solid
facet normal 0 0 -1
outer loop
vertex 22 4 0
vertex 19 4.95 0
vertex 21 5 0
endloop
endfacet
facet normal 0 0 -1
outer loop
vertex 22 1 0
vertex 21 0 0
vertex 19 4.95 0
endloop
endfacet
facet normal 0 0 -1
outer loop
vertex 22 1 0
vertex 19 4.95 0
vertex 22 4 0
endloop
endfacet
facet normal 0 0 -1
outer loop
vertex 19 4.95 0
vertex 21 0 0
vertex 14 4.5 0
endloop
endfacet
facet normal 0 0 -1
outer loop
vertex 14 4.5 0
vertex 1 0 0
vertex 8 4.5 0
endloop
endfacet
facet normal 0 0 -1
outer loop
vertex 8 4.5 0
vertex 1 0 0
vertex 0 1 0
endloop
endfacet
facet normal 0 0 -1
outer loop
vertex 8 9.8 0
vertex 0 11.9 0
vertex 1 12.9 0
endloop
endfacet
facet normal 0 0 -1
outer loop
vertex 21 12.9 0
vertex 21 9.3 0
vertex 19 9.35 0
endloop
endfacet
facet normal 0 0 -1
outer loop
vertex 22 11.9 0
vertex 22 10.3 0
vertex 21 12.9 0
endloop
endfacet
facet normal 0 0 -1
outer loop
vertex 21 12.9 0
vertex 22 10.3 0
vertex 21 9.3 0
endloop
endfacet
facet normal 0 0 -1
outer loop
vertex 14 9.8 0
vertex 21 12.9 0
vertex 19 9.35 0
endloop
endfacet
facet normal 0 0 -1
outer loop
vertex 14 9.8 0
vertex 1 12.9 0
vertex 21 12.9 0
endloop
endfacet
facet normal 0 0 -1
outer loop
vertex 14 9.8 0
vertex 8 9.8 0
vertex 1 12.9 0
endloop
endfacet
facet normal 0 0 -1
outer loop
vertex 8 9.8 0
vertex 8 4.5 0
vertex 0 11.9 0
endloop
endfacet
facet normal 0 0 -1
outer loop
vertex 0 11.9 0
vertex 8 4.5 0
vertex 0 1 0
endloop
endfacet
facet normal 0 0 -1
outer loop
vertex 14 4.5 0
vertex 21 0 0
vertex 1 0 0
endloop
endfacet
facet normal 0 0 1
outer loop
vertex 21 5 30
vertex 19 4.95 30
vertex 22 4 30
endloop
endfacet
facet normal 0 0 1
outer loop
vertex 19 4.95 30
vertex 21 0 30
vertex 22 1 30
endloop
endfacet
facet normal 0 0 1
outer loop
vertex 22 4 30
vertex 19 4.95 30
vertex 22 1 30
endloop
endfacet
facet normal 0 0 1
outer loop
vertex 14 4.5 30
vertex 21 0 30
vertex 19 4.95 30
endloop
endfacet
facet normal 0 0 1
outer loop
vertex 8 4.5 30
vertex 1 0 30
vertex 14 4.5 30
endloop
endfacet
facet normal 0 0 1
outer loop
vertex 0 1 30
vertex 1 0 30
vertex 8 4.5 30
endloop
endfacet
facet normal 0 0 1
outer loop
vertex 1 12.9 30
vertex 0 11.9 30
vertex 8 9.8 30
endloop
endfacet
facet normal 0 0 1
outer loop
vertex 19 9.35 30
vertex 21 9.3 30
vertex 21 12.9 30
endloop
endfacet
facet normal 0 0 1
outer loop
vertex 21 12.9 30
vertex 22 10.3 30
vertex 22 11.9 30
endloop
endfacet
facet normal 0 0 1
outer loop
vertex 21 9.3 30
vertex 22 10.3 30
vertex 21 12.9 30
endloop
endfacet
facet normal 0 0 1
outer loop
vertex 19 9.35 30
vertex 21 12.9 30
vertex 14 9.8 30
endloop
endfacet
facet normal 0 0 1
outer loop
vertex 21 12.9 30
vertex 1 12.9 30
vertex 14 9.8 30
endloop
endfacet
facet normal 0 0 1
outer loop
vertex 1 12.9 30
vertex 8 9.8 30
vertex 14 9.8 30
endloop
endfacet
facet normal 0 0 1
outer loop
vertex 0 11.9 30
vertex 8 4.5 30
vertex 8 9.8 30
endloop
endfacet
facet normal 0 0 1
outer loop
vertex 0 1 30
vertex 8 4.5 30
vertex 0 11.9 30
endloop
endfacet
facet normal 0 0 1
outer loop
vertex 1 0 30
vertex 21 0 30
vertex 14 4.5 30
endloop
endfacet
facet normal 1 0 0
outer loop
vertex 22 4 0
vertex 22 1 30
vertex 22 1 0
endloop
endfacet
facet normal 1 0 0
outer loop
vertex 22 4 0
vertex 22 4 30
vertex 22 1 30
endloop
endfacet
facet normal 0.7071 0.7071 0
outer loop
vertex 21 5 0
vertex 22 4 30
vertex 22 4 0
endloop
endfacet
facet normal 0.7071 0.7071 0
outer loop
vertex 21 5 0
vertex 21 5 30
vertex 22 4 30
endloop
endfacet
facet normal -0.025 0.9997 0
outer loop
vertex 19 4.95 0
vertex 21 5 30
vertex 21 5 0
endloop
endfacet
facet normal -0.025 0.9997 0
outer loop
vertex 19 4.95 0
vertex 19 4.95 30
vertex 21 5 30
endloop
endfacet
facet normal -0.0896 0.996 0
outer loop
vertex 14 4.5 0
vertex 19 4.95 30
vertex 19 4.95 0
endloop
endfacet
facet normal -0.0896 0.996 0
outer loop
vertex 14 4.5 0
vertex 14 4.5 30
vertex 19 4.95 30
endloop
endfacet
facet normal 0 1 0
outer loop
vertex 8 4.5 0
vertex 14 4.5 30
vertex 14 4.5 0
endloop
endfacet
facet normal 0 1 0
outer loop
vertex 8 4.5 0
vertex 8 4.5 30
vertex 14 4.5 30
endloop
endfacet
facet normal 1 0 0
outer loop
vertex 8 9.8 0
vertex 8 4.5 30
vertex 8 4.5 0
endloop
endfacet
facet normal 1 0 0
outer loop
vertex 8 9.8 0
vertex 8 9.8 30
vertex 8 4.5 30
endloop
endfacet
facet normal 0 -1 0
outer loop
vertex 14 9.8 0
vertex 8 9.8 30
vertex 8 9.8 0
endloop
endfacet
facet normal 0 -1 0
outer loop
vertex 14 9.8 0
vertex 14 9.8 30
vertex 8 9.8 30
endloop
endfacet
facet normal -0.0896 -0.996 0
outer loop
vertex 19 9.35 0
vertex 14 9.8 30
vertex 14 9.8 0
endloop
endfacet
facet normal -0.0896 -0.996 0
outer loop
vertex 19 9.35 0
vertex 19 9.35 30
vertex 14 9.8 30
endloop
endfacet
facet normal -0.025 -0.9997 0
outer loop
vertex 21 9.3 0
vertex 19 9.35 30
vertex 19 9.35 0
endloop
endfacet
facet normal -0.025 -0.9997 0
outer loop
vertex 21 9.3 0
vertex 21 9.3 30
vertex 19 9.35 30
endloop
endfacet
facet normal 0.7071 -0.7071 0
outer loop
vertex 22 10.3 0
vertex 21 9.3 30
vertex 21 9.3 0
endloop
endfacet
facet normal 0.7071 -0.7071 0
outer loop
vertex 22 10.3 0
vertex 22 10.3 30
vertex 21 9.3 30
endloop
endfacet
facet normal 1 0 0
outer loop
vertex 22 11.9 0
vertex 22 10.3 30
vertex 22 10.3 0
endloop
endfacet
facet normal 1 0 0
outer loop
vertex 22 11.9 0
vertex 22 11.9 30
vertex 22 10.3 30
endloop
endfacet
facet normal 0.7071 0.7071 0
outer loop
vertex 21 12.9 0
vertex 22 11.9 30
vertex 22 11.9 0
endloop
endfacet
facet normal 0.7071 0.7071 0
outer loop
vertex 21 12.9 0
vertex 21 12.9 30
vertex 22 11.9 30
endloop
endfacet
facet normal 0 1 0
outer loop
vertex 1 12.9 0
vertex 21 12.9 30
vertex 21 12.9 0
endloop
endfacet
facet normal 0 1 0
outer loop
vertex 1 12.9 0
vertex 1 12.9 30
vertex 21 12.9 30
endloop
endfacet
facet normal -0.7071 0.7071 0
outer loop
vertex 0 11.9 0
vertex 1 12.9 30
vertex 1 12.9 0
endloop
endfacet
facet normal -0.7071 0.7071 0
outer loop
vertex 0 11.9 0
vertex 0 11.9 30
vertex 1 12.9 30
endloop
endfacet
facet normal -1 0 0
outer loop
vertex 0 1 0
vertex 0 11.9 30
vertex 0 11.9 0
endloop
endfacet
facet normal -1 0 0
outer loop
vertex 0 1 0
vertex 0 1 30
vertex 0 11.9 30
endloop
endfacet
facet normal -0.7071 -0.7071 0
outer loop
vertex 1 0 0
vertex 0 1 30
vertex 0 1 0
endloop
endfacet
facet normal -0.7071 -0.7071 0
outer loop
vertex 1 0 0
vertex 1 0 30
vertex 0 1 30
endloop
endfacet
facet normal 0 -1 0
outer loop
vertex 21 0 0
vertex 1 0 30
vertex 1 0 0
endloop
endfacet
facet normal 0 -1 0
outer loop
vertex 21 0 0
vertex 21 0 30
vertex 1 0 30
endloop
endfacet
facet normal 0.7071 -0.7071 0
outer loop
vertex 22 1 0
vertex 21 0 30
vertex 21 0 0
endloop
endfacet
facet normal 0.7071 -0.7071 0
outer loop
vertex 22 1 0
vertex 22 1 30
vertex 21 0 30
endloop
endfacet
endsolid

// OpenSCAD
//DIe Laenge der Klammer
laenge=30;

//Weite der Basis
wbase=8;
//Weite des Arms oben (der Druckpunkt liegt etwas zurueck)
warmtop=14;
//Weite des Arms unten
warmbottom=14;

// Betthoehe (der Druck muss selbst eingerechnet werden zB 0.6 abziehen)
hbed=4.3;   
//Hoehe Arm oben (mehr als 4 geht beim Mendel90 nicht)
harmtop=3.6; 
//Hoehe Arm unten
harmbottom=5;

hall=hbed+harmtop+harmbottom;

	      	linear_extrude(height=laenge)
		      polygon(
		         points=[[0,1],
                       [0,hall-1],
                       [1,hall],
                       [wbase,hall],
                       [wbase+warmtop-1,hall],
                       [wbase+warmtop,hall-1],
                       [wbase+warmtop,hall-harmtop+1],
                       [wbase+warmtop-1,hall-harmtop],
                       [wbase+warmtop-3,hall-harmtop+0.05],
                       [wbase+warmtop-8,hall-harmtop+0.5],
                       [wbase,hall-harmtop+0.5],
                       
                       [wbase,harmbottom-0.5],
                       [wbase+warmbottom-8,harmbottom-0.5],
                       [wbase+warmbottom-3,harmbottom-0.05],
                       [wbase+warmbottom-1,harmbottom],
                       [wbase+warmbottom,harmbottom-1],
                       [wbase+warmbottom,1],
                       [wbase+warmbottom-1,0],
                       [wbase,0],
                       [1,0]
                       
                       ] 
                   );
